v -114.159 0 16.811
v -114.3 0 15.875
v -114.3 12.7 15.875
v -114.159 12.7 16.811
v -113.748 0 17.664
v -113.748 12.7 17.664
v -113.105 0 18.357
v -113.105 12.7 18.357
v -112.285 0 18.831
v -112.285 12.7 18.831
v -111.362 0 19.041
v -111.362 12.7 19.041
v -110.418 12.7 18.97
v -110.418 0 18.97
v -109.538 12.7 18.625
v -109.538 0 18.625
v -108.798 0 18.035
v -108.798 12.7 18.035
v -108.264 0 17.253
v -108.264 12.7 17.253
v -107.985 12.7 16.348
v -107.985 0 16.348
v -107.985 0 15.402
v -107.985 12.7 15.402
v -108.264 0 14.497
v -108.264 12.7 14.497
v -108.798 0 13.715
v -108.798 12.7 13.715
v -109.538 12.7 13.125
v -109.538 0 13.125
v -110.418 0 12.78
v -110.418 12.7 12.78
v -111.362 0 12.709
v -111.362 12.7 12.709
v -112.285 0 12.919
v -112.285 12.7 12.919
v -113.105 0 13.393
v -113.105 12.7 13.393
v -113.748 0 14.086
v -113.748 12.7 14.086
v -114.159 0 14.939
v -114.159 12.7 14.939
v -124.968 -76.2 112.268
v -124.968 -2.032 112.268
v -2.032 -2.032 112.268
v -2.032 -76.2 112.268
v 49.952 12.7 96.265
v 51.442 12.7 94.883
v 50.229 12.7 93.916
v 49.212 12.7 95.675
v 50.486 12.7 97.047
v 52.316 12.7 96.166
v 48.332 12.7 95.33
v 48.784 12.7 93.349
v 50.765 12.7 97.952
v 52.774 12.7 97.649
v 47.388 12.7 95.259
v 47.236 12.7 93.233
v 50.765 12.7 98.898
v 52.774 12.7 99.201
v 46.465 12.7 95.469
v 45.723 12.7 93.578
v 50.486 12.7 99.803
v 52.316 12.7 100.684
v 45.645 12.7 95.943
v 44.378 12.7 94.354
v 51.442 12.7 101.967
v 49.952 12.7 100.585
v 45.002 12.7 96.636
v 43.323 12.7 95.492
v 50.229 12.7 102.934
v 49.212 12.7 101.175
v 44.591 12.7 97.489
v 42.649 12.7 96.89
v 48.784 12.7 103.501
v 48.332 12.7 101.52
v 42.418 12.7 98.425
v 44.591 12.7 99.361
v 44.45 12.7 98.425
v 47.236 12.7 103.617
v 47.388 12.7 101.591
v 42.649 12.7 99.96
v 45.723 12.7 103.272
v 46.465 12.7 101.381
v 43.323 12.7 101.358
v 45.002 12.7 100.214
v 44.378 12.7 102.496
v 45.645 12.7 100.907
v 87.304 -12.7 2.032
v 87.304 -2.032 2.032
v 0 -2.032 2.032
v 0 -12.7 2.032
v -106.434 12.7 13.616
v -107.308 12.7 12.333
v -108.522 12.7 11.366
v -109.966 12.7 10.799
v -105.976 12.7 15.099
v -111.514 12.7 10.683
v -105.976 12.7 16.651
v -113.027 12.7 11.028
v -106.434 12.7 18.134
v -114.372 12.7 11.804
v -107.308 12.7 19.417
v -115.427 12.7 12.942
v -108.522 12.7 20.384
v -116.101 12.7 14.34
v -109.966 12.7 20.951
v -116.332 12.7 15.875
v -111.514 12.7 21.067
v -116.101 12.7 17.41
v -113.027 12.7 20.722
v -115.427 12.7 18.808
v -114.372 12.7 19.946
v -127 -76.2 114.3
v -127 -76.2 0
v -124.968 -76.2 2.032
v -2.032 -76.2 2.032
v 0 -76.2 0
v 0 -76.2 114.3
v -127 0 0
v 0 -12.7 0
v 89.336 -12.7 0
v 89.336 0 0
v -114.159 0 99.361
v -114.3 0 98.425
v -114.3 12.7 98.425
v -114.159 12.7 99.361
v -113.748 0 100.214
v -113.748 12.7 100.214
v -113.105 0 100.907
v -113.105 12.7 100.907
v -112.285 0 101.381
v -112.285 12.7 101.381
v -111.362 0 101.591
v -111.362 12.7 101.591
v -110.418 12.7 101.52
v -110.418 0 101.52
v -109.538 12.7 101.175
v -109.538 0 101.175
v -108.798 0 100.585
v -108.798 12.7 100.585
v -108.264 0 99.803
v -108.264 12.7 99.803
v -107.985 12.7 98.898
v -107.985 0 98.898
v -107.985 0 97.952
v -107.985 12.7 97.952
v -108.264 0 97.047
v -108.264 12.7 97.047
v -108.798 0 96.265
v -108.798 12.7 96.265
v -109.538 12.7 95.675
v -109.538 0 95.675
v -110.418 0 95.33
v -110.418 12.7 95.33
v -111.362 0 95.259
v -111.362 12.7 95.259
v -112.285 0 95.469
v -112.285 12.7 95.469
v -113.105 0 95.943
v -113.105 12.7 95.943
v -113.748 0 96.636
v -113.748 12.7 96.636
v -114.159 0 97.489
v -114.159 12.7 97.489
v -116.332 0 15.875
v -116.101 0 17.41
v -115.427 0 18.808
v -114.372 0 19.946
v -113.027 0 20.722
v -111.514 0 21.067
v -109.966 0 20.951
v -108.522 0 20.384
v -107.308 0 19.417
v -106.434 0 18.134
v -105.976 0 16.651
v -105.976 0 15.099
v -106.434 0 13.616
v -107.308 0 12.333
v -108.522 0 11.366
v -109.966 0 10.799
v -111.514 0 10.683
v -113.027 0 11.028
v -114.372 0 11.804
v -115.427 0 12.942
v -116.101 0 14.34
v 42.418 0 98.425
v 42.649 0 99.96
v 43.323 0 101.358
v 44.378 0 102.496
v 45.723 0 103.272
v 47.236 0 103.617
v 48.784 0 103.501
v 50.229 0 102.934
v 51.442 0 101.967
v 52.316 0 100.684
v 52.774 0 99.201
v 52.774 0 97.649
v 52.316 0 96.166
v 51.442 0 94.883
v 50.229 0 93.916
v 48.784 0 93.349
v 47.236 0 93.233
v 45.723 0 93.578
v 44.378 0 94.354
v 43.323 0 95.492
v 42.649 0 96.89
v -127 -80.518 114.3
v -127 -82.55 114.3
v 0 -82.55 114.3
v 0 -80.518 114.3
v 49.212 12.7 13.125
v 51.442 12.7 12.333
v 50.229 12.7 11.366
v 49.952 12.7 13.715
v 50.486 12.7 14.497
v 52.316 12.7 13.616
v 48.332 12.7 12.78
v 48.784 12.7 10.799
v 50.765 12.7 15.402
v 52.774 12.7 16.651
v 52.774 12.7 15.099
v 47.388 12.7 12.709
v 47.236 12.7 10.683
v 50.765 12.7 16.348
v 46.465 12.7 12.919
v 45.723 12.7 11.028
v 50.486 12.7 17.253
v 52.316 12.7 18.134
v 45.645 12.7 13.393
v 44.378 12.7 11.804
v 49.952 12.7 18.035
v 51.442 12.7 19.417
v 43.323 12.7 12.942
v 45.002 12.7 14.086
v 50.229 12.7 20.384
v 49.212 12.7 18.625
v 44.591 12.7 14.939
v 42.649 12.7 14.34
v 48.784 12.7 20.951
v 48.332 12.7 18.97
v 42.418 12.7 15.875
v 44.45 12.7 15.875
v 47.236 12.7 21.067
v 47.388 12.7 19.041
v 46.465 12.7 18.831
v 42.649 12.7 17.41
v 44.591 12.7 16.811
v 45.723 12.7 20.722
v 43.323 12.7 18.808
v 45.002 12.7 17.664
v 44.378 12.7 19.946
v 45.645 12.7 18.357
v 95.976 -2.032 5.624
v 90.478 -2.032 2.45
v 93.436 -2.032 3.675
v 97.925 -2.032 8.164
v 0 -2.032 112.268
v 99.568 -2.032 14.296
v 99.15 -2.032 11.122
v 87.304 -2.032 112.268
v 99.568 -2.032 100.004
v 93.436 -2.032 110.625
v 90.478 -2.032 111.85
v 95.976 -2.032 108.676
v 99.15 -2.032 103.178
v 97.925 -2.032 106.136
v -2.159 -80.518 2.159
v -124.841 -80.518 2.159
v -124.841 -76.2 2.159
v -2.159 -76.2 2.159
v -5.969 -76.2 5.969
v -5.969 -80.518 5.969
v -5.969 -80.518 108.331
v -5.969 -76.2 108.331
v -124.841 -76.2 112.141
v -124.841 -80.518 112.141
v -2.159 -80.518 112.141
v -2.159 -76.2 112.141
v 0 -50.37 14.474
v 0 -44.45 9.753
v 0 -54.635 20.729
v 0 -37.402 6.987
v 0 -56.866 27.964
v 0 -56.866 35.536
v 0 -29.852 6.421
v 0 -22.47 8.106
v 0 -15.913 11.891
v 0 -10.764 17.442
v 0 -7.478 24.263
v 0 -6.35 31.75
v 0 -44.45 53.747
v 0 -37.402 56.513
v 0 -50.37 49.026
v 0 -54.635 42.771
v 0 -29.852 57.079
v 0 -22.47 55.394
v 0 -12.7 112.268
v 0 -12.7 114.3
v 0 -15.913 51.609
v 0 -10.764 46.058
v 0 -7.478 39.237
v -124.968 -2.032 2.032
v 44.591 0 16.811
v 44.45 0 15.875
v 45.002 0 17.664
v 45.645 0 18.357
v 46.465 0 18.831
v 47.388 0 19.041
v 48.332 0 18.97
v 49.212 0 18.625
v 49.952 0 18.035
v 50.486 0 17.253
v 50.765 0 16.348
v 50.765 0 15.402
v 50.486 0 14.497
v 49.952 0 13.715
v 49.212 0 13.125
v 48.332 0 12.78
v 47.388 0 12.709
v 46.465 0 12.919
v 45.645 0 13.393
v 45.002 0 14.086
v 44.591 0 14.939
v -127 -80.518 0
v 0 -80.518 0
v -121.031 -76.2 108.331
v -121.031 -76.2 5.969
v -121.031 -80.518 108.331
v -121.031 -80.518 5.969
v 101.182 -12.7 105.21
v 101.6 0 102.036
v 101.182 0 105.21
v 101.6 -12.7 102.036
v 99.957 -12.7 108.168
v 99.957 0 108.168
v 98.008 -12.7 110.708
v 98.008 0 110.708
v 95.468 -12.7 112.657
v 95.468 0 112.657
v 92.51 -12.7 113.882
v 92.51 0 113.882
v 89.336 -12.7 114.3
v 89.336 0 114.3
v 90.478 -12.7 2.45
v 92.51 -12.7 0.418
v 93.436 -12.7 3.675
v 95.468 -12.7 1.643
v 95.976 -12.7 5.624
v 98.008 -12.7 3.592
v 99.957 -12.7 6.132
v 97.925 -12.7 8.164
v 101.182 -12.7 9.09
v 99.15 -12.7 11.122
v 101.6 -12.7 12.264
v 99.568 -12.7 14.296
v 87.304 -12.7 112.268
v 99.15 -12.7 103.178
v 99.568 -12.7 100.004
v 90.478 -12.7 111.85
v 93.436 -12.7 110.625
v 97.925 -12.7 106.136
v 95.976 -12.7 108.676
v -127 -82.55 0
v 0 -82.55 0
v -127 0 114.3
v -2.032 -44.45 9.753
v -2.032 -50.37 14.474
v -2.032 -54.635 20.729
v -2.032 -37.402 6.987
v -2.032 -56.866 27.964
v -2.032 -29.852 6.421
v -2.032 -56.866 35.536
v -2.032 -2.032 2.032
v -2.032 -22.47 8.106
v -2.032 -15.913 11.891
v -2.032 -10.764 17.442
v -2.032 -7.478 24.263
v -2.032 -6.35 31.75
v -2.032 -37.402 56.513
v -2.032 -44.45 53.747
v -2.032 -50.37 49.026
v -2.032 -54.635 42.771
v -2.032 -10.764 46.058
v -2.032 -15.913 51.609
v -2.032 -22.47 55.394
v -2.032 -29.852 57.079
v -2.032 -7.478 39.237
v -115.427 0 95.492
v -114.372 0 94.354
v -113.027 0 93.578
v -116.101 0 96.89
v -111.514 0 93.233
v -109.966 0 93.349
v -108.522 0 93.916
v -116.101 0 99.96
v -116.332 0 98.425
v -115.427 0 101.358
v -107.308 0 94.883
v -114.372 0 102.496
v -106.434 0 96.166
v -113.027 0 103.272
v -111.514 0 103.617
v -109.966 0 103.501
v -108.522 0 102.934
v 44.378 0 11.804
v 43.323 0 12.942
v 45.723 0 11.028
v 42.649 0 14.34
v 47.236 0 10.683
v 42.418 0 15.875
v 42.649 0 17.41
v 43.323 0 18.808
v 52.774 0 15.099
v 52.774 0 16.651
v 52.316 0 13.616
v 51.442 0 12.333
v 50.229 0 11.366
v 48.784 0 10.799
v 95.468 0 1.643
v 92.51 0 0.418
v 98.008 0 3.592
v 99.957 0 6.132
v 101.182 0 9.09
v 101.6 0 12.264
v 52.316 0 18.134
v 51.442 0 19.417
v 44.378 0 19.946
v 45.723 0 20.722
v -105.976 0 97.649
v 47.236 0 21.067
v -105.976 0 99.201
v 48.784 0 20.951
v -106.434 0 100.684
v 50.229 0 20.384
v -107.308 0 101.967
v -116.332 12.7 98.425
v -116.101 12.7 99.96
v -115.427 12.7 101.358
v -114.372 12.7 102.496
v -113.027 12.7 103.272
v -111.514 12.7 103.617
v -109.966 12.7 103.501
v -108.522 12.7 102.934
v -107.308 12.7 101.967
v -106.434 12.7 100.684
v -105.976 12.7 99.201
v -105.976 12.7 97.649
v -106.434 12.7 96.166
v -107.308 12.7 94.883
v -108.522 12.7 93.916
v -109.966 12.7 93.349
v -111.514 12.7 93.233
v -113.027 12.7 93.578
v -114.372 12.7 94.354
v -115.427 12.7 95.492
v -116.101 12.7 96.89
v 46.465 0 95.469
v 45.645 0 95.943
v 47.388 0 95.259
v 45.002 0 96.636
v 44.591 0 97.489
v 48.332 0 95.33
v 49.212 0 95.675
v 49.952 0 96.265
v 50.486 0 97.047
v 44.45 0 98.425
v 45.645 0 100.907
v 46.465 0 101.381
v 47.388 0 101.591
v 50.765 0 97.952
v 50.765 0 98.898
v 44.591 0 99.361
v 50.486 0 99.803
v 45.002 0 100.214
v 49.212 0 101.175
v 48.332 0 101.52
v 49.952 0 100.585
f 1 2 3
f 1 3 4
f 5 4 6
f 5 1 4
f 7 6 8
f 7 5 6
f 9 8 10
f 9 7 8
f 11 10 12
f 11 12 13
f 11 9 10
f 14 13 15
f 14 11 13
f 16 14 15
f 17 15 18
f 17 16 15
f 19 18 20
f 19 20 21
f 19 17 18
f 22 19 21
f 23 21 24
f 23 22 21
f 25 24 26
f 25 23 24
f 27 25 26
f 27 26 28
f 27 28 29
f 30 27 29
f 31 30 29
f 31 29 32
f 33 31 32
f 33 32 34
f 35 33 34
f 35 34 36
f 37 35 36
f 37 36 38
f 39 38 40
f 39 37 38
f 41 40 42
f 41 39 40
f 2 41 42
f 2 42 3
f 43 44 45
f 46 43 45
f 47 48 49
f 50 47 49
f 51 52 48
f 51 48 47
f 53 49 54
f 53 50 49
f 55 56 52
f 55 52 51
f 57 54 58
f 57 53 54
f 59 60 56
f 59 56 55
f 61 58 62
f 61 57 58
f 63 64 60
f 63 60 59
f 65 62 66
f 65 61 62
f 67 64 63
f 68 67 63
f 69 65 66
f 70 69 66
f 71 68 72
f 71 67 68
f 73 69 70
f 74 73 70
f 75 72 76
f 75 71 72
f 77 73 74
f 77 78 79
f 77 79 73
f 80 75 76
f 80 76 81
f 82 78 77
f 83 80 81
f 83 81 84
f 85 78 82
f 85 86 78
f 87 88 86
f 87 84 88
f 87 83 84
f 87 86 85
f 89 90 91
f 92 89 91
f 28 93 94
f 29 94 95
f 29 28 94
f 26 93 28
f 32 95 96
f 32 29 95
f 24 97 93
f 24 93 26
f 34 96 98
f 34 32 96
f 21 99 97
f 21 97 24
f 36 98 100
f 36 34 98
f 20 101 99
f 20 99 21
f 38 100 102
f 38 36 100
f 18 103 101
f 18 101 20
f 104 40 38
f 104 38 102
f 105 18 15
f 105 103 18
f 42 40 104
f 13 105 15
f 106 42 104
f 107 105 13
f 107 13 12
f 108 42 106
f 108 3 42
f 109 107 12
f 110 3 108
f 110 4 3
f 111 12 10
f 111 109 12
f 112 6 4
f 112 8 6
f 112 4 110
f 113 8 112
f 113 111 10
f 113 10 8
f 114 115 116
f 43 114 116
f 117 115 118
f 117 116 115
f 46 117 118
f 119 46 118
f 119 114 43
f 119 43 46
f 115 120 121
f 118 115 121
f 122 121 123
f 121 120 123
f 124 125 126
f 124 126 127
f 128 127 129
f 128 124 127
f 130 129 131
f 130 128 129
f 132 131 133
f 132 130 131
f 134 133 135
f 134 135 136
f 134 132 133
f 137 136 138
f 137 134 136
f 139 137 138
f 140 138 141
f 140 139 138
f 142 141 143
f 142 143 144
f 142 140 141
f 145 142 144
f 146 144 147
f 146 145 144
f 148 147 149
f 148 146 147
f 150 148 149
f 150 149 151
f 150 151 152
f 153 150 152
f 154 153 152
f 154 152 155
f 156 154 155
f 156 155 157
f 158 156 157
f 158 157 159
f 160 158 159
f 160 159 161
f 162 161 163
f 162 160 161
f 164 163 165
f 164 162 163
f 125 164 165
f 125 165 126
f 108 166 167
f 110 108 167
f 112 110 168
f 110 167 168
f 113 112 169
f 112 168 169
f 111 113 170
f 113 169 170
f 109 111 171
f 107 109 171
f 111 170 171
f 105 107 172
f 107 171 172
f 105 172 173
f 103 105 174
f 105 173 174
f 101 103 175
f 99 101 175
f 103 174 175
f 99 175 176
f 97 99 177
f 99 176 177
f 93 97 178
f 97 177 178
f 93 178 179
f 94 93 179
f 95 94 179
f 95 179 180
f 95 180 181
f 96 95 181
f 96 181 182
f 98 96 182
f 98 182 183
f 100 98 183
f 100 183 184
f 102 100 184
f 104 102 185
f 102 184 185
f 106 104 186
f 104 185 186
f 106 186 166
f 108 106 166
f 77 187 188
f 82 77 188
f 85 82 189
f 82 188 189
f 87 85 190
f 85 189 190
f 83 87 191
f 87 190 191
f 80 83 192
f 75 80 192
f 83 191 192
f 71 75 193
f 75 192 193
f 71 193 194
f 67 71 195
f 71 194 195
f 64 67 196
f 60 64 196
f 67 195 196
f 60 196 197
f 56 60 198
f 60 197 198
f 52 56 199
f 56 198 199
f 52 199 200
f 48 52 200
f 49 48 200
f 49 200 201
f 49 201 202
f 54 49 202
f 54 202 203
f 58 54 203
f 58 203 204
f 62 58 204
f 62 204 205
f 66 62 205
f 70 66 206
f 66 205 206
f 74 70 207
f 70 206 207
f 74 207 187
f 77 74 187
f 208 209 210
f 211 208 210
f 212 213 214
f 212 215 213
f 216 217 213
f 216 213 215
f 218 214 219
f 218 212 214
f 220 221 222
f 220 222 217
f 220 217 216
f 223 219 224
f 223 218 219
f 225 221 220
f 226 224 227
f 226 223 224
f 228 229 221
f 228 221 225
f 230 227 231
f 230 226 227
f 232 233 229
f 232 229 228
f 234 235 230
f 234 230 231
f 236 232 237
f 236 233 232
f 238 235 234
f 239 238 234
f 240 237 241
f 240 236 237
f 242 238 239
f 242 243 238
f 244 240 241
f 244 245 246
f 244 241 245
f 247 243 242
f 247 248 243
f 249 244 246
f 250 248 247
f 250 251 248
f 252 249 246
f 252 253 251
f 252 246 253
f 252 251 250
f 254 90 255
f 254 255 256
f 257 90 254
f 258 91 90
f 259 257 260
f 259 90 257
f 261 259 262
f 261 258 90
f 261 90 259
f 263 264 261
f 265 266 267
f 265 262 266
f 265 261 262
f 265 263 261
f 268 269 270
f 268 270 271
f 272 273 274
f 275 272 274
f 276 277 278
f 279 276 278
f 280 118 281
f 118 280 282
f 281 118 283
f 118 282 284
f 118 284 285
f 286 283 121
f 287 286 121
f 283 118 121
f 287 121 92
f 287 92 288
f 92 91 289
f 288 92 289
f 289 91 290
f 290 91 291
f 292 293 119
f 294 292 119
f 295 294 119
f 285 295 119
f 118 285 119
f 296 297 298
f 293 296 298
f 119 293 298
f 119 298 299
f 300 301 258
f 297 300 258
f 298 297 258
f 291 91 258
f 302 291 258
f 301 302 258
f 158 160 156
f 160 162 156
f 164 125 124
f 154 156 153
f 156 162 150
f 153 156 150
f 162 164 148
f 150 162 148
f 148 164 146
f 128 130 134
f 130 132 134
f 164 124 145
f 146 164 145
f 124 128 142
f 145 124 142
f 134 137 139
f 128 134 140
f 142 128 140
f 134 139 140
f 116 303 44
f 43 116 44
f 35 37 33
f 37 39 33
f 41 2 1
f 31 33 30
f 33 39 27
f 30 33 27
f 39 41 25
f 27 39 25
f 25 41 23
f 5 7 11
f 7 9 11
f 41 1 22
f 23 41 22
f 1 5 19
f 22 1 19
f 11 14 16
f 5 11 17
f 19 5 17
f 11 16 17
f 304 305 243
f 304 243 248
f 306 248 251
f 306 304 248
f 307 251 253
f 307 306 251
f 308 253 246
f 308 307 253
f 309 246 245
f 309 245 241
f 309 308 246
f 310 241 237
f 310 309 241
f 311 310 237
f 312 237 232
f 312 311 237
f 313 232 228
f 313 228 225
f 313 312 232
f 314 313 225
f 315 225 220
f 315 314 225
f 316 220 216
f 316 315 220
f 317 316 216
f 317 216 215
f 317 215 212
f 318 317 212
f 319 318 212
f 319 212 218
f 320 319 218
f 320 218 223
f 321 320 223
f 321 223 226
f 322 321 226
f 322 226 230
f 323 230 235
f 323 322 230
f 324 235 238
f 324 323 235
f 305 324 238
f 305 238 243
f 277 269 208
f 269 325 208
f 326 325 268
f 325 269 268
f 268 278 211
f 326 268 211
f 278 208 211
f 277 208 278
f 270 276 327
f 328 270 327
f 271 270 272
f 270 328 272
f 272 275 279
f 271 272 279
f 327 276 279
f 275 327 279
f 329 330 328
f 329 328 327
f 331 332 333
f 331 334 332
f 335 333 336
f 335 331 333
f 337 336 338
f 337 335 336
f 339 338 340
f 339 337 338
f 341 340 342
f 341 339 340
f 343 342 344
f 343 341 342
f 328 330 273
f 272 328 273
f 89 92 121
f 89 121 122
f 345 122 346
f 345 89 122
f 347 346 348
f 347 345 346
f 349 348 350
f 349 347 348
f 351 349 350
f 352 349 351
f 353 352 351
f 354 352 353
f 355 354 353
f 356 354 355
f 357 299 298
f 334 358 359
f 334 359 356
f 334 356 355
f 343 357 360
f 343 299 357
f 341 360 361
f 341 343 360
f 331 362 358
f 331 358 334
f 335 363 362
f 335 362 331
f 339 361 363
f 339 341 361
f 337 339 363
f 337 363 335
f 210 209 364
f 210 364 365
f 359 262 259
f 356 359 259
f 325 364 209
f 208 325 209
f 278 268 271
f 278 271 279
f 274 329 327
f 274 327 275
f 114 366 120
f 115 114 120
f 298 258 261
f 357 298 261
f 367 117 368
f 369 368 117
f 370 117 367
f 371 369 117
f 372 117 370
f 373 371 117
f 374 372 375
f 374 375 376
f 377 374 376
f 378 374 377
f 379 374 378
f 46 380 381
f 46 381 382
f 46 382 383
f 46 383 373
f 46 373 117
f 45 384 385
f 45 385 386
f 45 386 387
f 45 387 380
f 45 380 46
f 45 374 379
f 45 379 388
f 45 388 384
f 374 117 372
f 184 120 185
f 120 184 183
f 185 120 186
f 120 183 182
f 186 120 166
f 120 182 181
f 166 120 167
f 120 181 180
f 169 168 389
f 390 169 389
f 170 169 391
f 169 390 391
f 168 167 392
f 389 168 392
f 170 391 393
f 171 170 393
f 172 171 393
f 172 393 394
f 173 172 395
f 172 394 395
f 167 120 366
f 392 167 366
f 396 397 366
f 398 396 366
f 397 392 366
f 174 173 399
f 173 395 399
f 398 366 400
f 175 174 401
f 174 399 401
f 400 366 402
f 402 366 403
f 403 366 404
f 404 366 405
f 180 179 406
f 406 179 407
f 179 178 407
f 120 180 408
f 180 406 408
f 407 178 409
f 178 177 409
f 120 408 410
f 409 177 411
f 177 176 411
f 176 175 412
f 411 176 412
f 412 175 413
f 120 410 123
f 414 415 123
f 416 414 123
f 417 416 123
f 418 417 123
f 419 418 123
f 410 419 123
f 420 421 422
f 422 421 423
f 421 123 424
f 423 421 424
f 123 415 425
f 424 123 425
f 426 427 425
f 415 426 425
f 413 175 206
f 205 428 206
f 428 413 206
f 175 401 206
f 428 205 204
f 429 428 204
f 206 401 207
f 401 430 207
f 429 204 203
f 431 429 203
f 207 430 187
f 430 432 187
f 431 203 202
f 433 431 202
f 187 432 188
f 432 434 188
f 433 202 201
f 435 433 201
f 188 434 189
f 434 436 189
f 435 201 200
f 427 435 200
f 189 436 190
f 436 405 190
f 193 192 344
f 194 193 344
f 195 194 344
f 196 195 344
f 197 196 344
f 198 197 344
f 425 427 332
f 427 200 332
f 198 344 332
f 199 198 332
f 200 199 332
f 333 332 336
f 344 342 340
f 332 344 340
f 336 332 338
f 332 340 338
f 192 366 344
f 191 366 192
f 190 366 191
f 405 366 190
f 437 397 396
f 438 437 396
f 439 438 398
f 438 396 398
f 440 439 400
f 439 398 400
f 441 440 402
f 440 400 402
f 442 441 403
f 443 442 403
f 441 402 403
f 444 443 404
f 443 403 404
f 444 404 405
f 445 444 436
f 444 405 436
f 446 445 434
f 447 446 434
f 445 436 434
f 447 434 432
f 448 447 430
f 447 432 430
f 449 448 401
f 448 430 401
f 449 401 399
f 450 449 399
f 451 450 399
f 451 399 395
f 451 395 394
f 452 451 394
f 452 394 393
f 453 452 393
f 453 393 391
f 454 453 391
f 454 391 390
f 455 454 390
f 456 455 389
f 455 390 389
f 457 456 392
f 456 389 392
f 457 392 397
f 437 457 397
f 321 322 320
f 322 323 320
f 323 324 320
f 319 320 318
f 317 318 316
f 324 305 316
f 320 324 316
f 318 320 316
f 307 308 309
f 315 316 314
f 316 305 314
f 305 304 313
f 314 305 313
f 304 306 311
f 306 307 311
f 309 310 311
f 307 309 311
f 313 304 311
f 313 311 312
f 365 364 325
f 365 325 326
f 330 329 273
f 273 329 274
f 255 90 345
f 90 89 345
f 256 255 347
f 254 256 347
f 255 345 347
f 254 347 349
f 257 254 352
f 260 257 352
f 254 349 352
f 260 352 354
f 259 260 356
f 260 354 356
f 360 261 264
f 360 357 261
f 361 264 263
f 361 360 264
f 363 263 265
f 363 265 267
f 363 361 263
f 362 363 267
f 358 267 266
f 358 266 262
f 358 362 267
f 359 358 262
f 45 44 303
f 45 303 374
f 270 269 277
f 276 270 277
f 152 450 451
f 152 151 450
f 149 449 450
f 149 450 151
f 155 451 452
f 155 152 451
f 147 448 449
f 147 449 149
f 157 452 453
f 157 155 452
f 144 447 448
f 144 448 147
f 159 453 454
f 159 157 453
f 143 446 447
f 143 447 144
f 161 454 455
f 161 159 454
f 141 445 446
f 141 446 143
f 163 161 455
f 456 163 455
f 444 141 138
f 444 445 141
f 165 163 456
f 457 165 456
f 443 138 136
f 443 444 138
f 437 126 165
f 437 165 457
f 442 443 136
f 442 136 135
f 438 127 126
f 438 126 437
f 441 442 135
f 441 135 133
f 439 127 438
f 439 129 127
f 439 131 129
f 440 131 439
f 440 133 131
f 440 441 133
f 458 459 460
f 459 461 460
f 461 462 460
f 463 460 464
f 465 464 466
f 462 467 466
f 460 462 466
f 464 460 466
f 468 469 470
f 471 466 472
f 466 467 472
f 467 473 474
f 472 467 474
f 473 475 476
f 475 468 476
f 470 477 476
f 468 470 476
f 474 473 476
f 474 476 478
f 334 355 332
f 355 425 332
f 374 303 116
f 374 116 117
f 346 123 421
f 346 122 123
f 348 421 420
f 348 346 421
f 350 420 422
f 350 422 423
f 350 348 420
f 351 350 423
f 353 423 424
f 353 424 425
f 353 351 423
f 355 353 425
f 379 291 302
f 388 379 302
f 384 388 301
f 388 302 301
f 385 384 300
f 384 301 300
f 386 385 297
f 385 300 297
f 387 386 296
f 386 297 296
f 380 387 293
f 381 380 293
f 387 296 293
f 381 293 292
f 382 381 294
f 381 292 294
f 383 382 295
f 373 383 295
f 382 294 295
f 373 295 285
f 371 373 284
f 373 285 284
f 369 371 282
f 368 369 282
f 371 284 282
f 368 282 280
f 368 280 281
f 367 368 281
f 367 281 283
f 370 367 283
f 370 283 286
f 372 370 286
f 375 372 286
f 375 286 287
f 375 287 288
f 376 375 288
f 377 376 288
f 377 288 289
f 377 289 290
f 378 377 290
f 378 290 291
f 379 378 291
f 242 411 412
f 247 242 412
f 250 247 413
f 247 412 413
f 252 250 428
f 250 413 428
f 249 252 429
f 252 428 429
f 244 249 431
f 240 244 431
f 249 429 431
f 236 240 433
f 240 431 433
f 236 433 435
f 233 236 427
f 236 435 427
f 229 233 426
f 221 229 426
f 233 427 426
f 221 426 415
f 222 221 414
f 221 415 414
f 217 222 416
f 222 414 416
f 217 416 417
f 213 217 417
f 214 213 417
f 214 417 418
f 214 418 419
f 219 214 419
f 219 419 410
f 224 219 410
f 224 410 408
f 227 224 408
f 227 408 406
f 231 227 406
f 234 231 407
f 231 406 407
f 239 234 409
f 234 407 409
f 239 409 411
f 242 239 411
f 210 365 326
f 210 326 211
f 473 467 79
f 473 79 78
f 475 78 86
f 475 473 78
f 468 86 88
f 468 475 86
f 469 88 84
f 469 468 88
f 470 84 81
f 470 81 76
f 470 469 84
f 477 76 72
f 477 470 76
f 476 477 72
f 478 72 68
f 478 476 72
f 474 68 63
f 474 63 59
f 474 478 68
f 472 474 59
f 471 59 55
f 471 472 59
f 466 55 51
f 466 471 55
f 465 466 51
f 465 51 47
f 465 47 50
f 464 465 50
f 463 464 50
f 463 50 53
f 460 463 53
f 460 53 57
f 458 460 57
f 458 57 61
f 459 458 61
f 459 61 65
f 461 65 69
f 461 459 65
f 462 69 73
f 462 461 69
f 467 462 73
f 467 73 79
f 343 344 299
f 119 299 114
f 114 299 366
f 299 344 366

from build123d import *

# Parameters (mm, degrees)
F0_W      = 122.936
F0_H      = 110.236
F1_DEPTH  = 76.2
F2_DEPTH  = 2.032
F5_W      = 127
F5_H      = 114.3
F5_W_2    = 122.682
F5_H_2    = 109.982
F5_W_3    = 115.062
F5_H_3    = 102.362
F6_DEPTH  = 2.032
F7_DEPTH  = 6.35
F0_W_2    = 99.568
F8_DEPTH  = 2.032
F9_DEPTH  = 12.7
F3_R      = 25.4
F10_DEPTH = 6.35
F11_R     = 12.2642048969
F12_R     = 5.207
F12_R_2   = 3.175
F13_DEPTH = 12.7


with BuildPart() as f1:
    # F0 (on Front) → F1 (new body)
    with BuildSketch(Plane.XZ):
        Polygon((0, 114.3), (-127, 114.3), (-127, 0), (0, 0), (0, 2.032), (0, 112.268), align=None)
        with Locations((-63.5, 57.15)):
            Rectangle(F0_W, F0_H, mode=Mode.SUBTRACT)
    extrude(amount=F1_DEPTH)

    # F0 (on Front) → F2 (join)
    with BuildSketch(Plane.XZ):
        with Locations((-63.5, 57.15)):
            Rectangle(F0_W, F0_H)
    extrude(amount=F2_DEPTH)

    # F0 (on Front) → F8 (join)
    with BuildSketch(Plane.XZ):
        with Locations((49.784, 57.15)):
            Rectangle(F0_W_2, F0_H)
        Polygon((101.6, 114.3), (0, 114.3), (0, 112.268), (99.568, 112.268), (99.568, 2.032), (0, 2.032), (0, 0), (101.6, 0), align=None)
    extrude(amount=F8_DEPTH)

    # F0 (on Front) → F9 (join)
    with BuildSketch(Plane.XZ):
        Polygon((101.6, 114.3), (0, 114.3), (0, 112.268), (99.568, 112.268), (99.568, 2.032), (0, 2.032), (0, 0), (101.6, 0), align=None)
    extrude(amount=F9_DEPTH)

    # F3 (on face) → F10 (cut)
    with BuildSketch(Plane.YZ):
        with Locations((-31.75, 31.75)):
            Circle(F3_R)
    extrude(amount=-F10_DEPTH, mode=Mode.SUBTRACT)

    # F11
    f11_edges = [f1.edges().sort_by_distance(p)[0] for p in [
        (101.6, -6.35, 0),
        (99.568, -7.366, 2.032),
        (99.568, -7.366, 112.268),
        (101.6, -6.35, 114.3),
    ]]
    fillet(f11_edges, radius=F11_R)

    # F12 (on face) → F13 (join)
    with BuildSketch(Plane(origin=(0, 0, 0), x_dir=(-1, 0, 0), z_dir=(0, 1, 0))):
        with Locations((111.125, 15.875)):
            Circle(F12_R)
        with Locations((111.125, 15.875)):
            Circle(F12_R_2, mode=Mode.SUBTRACT)
        with Locations((111.125, 98.425)):
            Circle(F12_R)
        with Locations((111.125, 98.425)):
            Circle(F12_R_2, mode=Mode.SUBTRACT)
        with Locations((-47.625, 98.425)):
            Circle(F12_R)
        with Locations((-47.625, 98.425)):
            Circle(F12_R_2, mode=Mode.SUBTRACT)
        with Locations((-47.625, 15.875)):
            Circle(F12_R)
        with Locations((-47.625, 15.875)):
            Circle(F12_R_2, mode=Mode.SUBTRACT)
    extrude(amount=F13_DEPTH)


with BuildPart() as f6:
    # F5 (on offset) → F6 (new body)
    with BuildSketch(Plane.XZ.offset(82.55)):
        with Locations((-63.5, 57.15)):
            Rectangle(F5_W, F5_H)
        with Locations((-63.5, 57.15)):
            Rectangle(F5_W_2, F5_H_2, mode=Mode.SUBTRACT)
        with Locations((-63.5, 57.15)):
            Rectangle(F5_W_2, F5_H_2)
        with Locations((-63.5, 57.15)):
            Rectangle(F5_W_3, F5_H_3, mode=Mode.SUBTRACT)
        with Locations((-63.5, 57.15)):
            Rectangle(F5_W_3, F5_H_3)
    extrude(amount=-F6_DEPTH)

    # F5 (on offset) → F7 (join)
    with BuildSketch(Plane.XZ.offset(82.55)):
        with Locations((-63.5, 57.15)):
            Rectangle(F5_W_2, F5_H_2)
        with Locations((-63.5, 57.15)):
            Rectangle(F5_W_3, F5_H_3, mode=Mode.SUBTRACT)
    extrude(amount=-F7_DEPTH)


solid = Compound([f1.part, f6.part])
